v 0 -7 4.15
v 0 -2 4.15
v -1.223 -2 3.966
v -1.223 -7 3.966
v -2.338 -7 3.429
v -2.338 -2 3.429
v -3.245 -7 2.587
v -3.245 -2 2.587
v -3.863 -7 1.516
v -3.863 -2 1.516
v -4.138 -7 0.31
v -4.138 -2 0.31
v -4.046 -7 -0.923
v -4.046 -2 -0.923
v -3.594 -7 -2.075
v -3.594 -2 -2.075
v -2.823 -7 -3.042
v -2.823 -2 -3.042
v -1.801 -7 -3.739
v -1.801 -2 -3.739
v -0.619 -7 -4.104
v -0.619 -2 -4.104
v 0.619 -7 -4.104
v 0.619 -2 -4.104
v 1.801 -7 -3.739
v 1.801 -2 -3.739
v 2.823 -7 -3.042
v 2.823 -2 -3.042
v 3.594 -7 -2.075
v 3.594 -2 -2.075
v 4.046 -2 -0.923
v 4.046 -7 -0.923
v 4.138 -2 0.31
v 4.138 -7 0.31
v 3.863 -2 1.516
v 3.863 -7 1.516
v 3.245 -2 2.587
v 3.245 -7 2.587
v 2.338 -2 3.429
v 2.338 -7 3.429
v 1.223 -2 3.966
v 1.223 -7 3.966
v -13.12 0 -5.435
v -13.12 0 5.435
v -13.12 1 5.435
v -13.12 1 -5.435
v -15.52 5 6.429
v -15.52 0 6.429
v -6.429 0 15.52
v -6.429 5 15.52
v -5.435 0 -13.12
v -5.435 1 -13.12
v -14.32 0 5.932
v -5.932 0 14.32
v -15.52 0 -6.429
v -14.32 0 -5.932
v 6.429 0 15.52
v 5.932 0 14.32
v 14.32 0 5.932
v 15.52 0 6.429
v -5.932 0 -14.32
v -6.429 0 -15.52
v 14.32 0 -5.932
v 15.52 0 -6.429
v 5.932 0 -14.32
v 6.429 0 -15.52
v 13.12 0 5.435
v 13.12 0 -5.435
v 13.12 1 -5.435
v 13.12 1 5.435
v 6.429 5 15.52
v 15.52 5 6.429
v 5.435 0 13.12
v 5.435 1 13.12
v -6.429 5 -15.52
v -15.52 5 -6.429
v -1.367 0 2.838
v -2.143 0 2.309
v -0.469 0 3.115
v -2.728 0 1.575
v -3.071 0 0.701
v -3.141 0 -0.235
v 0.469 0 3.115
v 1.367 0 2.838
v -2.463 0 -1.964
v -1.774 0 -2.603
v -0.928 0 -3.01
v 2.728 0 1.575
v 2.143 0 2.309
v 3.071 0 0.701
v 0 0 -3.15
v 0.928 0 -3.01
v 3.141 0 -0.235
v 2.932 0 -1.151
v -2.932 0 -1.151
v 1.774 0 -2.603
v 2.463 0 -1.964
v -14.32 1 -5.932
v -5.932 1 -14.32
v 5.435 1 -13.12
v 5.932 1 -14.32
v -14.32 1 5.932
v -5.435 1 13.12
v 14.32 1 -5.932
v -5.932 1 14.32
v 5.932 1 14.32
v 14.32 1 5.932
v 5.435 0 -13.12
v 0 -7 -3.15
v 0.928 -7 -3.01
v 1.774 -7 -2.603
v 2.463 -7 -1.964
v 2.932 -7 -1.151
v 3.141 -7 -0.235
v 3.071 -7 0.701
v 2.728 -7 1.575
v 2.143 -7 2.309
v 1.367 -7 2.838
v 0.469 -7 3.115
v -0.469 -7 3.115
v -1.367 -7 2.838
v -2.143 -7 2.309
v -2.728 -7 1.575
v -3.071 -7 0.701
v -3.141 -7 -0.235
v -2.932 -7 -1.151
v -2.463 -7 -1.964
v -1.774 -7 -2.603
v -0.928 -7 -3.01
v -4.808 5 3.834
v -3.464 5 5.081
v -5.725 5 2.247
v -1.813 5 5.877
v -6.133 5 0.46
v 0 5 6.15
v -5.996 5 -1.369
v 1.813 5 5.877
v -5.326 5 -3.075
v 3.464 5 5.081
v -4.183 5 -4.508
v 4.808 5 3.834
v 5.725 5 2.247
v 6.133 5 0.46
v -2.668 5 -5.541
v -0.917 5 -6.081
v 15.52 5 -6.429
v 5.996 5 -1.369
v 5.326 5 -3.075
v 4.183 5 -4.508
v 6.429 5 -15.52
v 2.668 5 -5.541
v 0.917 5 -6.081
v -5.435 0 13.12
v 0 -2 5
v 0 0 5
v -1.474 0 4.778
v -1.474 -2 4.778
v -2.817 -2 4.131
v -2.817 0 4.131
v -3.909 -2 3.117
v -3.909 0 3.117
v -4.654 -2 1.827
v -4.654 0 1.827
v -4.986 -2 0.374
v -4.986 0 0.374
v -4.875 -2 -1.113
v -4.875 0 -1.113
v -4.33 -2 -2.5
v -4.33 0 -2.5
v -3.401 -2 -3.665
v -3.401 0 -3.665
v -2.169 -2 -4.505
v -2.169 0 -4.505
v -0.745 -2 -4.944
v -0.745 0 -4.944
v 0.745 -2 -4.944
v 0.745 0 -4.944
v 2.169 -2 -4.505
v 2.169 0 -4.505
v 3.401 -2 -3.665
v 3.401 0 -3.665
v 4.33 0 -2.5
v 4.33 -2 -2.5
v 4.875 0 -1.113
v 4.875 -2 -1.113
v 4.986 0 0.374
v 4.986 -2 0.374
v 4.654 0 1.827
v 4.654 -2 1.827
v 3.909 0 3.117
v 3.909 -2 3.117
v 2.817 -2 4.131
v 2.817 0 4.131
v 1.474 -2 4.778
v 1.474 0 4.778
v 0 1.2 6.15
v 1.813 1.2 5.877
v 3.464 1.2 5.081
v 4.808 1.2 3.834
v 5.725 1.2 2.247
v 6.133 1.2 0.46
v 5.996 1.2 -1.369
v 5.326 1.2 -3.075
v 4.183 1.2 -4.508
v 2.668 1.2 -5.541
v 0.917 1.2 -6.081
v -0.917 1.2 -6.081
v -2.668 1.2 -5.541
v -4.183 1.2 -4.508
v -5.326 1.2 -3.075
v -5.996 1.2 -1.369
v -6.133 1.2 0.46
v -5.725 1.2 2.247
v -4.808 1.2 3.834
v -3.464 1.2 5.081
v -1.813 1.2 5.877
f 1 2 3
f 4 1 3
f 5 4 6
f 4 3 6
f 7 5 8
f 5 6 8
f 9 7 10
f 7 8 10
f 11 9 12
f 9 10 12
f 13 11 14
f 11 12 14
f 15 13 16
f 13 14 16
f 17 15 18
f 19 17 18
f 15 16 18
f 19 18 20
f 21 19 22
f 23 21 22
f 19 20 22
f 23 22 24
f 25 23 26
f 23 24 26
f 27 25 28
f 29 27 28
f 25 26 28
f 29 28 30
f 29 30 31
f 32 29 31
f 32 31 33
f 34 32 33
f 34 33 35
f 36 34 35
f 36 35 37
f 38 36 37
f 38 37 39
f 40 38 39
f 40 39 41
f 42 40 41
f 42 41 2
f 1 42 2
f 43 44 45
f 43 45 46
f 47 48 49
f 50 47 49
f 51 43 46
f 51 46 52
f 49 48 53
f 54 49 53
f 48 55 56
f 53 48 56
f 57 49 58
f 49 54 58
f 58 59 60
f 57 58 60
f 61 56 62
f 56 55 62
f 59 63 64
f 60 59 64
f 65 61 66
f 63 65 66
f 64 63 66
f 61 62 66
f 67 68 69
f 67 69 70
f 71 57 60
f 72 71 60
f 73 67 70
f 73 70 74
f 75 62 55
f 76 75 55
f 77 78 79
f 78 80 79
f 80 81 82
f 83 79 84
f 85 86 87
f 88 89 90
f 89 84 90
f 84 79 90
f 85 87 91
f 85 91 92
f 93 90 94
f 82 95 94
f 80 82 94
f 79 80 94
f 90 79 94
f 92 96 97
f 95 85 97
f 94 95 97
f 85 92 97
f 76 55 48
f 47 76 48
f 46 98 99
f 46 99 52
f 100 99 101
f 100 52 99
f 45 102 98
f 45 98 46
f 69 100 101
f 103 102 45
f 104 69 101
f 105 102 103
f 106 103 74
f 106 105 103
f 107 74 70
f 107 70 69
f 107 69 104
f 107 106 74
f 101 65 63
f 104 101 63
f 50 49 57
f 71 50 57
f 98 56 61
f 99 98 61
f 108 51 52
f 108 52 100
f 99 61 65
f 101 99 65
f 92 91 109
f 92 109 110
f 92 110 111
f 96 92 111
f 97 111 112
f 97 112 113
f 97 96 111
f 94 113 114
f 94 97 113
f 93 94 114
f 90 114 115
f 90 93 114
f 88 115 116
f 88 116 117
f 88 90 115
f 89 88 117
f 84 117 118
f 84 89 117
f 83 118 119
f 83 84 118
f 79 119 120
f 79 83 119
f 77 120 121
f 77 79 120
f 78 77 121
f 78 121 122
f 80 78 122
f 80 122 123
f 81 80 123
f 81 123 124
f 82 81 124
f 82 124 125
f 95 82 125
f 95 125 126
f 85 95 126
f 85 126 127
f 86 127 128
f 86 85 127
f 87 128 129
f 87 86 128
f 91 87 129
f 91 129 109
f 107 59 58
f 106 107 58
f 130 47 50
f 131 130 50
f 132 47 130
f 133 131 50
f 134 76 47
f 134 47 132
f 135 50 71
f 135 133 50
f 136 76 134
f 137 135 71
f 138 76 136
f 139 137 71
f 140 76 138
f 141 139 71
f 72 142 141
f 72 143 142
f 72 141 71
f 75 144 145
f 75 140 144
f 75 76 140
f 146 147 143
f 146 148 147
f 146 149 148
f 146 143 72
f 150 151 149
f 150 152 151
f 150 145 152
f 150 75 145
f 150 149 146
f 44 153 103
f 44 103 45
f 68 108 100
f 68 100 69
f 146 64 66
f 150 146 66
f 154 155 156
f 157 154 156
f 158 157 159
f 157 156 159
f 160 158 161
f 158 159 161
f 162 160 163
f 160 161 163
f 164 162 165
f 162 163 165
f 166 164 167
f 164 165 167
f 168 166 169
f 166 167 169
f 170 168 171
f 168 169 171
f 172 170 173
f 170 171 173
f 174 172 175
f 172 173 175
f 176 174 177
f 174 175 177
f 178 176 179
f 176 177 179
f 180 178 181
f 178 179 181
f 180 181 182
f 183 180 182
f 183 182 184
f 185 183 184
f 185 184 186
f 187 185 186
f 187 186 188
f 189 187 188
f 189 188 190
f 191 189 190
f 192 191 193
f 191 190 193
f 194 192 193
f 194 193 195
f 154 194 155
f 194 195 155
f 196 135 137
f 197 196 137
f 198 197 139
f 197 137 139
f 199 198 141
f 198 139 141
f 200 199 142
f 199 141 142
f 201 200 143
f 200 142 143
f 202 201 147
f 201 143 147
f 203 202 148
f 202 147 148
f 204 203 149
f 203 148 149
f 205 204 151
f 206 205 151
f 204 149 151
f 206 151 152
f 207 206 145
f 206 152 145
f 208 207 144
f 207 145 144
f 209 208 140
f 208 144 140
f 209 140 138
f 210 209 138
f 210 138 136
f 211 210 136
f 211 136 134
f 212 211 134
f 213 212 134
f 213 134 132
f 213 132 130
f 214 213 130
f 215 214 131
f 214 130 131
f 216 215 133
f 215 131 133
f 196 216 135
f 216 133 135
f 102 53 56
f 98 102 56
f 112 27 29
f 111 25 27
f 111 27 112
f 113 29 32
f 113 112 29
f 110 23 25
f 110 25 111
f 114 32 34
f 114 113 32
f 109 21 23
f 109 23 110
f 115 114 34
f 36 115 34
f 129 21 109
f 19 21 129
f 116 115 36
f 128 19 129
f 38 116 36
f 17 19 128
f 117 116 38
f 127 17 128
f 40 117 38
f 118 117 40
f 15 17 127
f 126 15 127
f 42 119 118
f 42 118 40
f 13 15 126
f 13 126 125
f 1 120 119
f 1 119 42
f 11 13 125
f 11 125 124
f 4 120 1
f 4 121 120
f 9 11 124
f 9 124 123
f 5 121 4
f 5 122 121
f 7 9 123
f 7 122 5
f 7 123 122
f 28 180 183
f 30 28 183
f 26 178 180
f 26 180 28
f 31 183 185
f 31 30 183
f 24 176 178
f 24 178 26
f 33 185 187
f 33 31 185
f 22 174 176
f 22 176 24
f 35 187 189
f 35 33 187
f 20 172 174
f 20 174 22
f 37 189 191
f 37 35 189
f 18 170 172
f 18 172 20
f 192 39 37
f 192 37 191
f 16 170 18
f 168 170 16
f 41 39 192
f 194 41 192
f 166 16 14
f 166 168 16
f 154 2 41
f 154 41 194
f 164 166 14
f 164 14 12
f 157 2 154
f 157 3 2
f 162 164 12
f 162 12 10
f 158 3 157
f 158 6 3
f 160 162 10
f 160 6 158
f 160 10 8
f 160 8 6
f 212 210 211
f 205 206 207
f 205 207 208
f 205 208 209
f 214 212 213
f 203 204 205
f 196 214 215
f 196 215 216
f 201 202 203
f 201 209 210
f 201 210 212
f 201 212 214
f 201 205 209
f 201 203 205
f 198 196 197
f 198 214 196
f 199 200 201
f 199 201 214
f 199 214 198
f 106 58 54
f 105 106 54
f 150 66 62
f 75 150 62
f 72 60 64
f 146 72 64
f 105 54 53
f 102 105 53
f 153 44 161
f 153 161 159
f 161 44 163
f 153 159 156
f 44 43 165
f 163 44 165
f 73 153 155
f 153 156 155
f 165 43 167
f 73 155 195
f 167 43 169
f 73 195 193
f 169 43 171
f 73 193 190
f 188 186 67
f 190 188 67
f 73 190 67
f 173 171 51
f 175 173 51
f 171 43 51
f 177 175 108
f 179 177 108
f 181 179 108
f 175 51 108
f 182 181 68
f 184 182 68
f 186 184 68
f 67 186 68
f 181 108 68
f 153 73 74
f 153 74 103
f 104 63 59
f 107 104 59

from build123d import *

# Parameters (mm, degrees)
EXTRUDE_1_DEPTH     = 5
CUT_EXTRUDE_1_DEPTH = 1
SKETCH_6_R          = 6.15
CUT_EXTRUDE_2_DEPTH = 3.8
SKETCH_8_R          = 4.15
SKETCH_8_R_2        = 3.15
EXTRUDE_4_DEPTH     = 7
SKETCH_9_R          = 5
SKETCH_9_R_2        = 4.15
EXTRUDE_5_DEPTH     = 2


with BuildPart() as part:
    # 스케치1 → 보스-돌출1 (new body)
    with BuildSketch(Plane(origin=(0, 0, 0), x_dir=(1, 0, 0), z_dir=(0, 1, 0))):
        Polygon((15.520132754, 6.428649477), (6.428649477, 15.520132754), (-6.428649477, 15.520132754), (-15.520132754, 6.428649477), (-15.520132754, -6.428649477), (-6.428649477, -15.520132754), (6.428649477, -15.520132754), (15.520132754, -6.428649477), align=None)
        Polygon((5.931593202, 14.320132754), (-5.931593202, 14.320132754), (-14.320132754, 5.931593202), (-14.320132754, -5.931593202), (-5.931593202, -14.320132754), (5.931593202, -14.320132754), (14.320132754, -5.931593202), (14.320132754, 5.931593202), align=None, mode=Mode.SUBTRACT)
        Polygon((14.320132754, 5.931593202), (5.931593202, 14.320132754), (-5.931593202, 14.320132754), (-14.320132754, 5.931593202), (-14.320132754, -5.931593202), (-5.931593202, -14.320132754), (5.931593202, -14.320132754), (14.320132754, -5.931593202), align=None)
    extrude(amount=EXTRUDE_1_DEPTH)

    # 스케치3 → 컷-돌출1 (cut)
    with BuildSketch(Plane.XZ):
        Polygon((5.931593202, -14.320132754), (14.320132754, -5.931593202), (14.320132754, 5.931593202), (5.931593202, 14.320132754), (-5.931593202, 14.320132754), (-14.320132754, 5.931593202), (-14.320132754, -5.931593202), (-5.931593202, -14.320132754), align=None)
        Polygon((5.434536927, -13.120132754), (13.120132754, -5.434536927), (13.120132754, 5.434536927), (5.434536927, 13.120132754), (-5.434536927, 13.120132754), (-13.120132754, 5.434536927), (-13.120132754, -5.434536927), (-5.434536927, -13.120132754), align=None, mode=Mode.SUBTRACT)
    extrude(amount=-CUT_EXTRUDE_1_DEPTH, mode=Mode.SUBTRACT)

    # 스케치6 → 컷-돌출2 (cut)
    with BuildSketch(Plane(origin=(0, 5, 0), x_dir=(1, 0, 0), z_dir=(0, 1, 0))):
        with Locations(Location((0, 0, 0), (0, 0, 270))):
            Circle(SKETCH_6_R)
    extrude(amount=-CUT_EXTRUDE_2_DEPTH, mode=Mode.SUBTRACT)

    # 스케치8 → 보스-돌출4 (add)
    with BuildSketch(Plane.XZ):
        with Locations(Location((0, 0, 0), (0, 0, 90))):
            Circle(SKETCH_8_R)
        with Locations(Location((0, 0, 0), (0, 0, 270))):
            Circle(SKETCH_8_R_2, mode=Mode.SUBTRACT)
    extrude(amount=EXTRUDE_4_DEPTH)

    # 스케치9 → 보스-돌출5 (add)
    with BuildSketch(Plane.XZ):
        with Locations(Location((0, 0, 0), (0, 0, 90))):
            Circle(SKETCH_9_R)
        with Locations(Location((0, 0, 0), (0, 0, 270))):
            Circle(SKETCH_9_R_2, mode=Mode.SUBTRACT)
    extrude(amount=EXTRUDE_5_DEPTH)


solid = part.part
